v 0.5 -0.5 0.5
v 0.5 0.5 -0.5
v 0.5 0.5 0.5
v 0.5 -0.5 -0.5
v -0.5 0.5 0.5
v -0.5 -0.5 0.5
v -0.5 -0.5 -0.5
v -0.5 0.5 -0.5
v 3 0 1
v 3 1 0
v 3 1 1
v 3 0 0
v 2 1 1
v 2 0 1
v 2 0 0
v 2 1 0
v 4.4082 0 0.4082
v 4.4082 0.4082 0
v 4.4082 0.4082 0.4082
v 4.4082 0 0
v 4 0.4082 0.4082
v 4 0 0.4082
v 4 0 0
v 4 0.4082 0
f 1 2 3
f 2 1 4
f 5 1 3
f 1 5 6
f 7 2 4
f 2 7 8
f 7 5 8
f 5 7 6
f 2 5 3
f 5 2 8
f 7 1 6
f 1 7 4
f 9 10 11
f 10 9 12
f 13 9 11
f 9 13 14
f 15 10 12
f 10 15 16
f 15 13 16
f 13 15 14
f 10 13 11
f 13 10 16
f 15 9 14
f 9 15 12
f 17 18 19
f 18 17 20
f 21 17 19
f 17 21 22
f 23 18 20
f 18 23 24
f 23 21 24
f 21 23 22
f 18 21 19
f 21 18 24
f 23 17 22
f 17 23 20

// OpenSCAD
color("red") cube([1, 1, 1], true); // Centered
color("green") translate([2, 0, 0]) cube([1, 1, 1]); // Unit edges, unit volume
color("blue") translate([4, 0, 0]) cube([sqrt(1/6), sqrt(1/6), sqrt(1/6)]); // Unit area
